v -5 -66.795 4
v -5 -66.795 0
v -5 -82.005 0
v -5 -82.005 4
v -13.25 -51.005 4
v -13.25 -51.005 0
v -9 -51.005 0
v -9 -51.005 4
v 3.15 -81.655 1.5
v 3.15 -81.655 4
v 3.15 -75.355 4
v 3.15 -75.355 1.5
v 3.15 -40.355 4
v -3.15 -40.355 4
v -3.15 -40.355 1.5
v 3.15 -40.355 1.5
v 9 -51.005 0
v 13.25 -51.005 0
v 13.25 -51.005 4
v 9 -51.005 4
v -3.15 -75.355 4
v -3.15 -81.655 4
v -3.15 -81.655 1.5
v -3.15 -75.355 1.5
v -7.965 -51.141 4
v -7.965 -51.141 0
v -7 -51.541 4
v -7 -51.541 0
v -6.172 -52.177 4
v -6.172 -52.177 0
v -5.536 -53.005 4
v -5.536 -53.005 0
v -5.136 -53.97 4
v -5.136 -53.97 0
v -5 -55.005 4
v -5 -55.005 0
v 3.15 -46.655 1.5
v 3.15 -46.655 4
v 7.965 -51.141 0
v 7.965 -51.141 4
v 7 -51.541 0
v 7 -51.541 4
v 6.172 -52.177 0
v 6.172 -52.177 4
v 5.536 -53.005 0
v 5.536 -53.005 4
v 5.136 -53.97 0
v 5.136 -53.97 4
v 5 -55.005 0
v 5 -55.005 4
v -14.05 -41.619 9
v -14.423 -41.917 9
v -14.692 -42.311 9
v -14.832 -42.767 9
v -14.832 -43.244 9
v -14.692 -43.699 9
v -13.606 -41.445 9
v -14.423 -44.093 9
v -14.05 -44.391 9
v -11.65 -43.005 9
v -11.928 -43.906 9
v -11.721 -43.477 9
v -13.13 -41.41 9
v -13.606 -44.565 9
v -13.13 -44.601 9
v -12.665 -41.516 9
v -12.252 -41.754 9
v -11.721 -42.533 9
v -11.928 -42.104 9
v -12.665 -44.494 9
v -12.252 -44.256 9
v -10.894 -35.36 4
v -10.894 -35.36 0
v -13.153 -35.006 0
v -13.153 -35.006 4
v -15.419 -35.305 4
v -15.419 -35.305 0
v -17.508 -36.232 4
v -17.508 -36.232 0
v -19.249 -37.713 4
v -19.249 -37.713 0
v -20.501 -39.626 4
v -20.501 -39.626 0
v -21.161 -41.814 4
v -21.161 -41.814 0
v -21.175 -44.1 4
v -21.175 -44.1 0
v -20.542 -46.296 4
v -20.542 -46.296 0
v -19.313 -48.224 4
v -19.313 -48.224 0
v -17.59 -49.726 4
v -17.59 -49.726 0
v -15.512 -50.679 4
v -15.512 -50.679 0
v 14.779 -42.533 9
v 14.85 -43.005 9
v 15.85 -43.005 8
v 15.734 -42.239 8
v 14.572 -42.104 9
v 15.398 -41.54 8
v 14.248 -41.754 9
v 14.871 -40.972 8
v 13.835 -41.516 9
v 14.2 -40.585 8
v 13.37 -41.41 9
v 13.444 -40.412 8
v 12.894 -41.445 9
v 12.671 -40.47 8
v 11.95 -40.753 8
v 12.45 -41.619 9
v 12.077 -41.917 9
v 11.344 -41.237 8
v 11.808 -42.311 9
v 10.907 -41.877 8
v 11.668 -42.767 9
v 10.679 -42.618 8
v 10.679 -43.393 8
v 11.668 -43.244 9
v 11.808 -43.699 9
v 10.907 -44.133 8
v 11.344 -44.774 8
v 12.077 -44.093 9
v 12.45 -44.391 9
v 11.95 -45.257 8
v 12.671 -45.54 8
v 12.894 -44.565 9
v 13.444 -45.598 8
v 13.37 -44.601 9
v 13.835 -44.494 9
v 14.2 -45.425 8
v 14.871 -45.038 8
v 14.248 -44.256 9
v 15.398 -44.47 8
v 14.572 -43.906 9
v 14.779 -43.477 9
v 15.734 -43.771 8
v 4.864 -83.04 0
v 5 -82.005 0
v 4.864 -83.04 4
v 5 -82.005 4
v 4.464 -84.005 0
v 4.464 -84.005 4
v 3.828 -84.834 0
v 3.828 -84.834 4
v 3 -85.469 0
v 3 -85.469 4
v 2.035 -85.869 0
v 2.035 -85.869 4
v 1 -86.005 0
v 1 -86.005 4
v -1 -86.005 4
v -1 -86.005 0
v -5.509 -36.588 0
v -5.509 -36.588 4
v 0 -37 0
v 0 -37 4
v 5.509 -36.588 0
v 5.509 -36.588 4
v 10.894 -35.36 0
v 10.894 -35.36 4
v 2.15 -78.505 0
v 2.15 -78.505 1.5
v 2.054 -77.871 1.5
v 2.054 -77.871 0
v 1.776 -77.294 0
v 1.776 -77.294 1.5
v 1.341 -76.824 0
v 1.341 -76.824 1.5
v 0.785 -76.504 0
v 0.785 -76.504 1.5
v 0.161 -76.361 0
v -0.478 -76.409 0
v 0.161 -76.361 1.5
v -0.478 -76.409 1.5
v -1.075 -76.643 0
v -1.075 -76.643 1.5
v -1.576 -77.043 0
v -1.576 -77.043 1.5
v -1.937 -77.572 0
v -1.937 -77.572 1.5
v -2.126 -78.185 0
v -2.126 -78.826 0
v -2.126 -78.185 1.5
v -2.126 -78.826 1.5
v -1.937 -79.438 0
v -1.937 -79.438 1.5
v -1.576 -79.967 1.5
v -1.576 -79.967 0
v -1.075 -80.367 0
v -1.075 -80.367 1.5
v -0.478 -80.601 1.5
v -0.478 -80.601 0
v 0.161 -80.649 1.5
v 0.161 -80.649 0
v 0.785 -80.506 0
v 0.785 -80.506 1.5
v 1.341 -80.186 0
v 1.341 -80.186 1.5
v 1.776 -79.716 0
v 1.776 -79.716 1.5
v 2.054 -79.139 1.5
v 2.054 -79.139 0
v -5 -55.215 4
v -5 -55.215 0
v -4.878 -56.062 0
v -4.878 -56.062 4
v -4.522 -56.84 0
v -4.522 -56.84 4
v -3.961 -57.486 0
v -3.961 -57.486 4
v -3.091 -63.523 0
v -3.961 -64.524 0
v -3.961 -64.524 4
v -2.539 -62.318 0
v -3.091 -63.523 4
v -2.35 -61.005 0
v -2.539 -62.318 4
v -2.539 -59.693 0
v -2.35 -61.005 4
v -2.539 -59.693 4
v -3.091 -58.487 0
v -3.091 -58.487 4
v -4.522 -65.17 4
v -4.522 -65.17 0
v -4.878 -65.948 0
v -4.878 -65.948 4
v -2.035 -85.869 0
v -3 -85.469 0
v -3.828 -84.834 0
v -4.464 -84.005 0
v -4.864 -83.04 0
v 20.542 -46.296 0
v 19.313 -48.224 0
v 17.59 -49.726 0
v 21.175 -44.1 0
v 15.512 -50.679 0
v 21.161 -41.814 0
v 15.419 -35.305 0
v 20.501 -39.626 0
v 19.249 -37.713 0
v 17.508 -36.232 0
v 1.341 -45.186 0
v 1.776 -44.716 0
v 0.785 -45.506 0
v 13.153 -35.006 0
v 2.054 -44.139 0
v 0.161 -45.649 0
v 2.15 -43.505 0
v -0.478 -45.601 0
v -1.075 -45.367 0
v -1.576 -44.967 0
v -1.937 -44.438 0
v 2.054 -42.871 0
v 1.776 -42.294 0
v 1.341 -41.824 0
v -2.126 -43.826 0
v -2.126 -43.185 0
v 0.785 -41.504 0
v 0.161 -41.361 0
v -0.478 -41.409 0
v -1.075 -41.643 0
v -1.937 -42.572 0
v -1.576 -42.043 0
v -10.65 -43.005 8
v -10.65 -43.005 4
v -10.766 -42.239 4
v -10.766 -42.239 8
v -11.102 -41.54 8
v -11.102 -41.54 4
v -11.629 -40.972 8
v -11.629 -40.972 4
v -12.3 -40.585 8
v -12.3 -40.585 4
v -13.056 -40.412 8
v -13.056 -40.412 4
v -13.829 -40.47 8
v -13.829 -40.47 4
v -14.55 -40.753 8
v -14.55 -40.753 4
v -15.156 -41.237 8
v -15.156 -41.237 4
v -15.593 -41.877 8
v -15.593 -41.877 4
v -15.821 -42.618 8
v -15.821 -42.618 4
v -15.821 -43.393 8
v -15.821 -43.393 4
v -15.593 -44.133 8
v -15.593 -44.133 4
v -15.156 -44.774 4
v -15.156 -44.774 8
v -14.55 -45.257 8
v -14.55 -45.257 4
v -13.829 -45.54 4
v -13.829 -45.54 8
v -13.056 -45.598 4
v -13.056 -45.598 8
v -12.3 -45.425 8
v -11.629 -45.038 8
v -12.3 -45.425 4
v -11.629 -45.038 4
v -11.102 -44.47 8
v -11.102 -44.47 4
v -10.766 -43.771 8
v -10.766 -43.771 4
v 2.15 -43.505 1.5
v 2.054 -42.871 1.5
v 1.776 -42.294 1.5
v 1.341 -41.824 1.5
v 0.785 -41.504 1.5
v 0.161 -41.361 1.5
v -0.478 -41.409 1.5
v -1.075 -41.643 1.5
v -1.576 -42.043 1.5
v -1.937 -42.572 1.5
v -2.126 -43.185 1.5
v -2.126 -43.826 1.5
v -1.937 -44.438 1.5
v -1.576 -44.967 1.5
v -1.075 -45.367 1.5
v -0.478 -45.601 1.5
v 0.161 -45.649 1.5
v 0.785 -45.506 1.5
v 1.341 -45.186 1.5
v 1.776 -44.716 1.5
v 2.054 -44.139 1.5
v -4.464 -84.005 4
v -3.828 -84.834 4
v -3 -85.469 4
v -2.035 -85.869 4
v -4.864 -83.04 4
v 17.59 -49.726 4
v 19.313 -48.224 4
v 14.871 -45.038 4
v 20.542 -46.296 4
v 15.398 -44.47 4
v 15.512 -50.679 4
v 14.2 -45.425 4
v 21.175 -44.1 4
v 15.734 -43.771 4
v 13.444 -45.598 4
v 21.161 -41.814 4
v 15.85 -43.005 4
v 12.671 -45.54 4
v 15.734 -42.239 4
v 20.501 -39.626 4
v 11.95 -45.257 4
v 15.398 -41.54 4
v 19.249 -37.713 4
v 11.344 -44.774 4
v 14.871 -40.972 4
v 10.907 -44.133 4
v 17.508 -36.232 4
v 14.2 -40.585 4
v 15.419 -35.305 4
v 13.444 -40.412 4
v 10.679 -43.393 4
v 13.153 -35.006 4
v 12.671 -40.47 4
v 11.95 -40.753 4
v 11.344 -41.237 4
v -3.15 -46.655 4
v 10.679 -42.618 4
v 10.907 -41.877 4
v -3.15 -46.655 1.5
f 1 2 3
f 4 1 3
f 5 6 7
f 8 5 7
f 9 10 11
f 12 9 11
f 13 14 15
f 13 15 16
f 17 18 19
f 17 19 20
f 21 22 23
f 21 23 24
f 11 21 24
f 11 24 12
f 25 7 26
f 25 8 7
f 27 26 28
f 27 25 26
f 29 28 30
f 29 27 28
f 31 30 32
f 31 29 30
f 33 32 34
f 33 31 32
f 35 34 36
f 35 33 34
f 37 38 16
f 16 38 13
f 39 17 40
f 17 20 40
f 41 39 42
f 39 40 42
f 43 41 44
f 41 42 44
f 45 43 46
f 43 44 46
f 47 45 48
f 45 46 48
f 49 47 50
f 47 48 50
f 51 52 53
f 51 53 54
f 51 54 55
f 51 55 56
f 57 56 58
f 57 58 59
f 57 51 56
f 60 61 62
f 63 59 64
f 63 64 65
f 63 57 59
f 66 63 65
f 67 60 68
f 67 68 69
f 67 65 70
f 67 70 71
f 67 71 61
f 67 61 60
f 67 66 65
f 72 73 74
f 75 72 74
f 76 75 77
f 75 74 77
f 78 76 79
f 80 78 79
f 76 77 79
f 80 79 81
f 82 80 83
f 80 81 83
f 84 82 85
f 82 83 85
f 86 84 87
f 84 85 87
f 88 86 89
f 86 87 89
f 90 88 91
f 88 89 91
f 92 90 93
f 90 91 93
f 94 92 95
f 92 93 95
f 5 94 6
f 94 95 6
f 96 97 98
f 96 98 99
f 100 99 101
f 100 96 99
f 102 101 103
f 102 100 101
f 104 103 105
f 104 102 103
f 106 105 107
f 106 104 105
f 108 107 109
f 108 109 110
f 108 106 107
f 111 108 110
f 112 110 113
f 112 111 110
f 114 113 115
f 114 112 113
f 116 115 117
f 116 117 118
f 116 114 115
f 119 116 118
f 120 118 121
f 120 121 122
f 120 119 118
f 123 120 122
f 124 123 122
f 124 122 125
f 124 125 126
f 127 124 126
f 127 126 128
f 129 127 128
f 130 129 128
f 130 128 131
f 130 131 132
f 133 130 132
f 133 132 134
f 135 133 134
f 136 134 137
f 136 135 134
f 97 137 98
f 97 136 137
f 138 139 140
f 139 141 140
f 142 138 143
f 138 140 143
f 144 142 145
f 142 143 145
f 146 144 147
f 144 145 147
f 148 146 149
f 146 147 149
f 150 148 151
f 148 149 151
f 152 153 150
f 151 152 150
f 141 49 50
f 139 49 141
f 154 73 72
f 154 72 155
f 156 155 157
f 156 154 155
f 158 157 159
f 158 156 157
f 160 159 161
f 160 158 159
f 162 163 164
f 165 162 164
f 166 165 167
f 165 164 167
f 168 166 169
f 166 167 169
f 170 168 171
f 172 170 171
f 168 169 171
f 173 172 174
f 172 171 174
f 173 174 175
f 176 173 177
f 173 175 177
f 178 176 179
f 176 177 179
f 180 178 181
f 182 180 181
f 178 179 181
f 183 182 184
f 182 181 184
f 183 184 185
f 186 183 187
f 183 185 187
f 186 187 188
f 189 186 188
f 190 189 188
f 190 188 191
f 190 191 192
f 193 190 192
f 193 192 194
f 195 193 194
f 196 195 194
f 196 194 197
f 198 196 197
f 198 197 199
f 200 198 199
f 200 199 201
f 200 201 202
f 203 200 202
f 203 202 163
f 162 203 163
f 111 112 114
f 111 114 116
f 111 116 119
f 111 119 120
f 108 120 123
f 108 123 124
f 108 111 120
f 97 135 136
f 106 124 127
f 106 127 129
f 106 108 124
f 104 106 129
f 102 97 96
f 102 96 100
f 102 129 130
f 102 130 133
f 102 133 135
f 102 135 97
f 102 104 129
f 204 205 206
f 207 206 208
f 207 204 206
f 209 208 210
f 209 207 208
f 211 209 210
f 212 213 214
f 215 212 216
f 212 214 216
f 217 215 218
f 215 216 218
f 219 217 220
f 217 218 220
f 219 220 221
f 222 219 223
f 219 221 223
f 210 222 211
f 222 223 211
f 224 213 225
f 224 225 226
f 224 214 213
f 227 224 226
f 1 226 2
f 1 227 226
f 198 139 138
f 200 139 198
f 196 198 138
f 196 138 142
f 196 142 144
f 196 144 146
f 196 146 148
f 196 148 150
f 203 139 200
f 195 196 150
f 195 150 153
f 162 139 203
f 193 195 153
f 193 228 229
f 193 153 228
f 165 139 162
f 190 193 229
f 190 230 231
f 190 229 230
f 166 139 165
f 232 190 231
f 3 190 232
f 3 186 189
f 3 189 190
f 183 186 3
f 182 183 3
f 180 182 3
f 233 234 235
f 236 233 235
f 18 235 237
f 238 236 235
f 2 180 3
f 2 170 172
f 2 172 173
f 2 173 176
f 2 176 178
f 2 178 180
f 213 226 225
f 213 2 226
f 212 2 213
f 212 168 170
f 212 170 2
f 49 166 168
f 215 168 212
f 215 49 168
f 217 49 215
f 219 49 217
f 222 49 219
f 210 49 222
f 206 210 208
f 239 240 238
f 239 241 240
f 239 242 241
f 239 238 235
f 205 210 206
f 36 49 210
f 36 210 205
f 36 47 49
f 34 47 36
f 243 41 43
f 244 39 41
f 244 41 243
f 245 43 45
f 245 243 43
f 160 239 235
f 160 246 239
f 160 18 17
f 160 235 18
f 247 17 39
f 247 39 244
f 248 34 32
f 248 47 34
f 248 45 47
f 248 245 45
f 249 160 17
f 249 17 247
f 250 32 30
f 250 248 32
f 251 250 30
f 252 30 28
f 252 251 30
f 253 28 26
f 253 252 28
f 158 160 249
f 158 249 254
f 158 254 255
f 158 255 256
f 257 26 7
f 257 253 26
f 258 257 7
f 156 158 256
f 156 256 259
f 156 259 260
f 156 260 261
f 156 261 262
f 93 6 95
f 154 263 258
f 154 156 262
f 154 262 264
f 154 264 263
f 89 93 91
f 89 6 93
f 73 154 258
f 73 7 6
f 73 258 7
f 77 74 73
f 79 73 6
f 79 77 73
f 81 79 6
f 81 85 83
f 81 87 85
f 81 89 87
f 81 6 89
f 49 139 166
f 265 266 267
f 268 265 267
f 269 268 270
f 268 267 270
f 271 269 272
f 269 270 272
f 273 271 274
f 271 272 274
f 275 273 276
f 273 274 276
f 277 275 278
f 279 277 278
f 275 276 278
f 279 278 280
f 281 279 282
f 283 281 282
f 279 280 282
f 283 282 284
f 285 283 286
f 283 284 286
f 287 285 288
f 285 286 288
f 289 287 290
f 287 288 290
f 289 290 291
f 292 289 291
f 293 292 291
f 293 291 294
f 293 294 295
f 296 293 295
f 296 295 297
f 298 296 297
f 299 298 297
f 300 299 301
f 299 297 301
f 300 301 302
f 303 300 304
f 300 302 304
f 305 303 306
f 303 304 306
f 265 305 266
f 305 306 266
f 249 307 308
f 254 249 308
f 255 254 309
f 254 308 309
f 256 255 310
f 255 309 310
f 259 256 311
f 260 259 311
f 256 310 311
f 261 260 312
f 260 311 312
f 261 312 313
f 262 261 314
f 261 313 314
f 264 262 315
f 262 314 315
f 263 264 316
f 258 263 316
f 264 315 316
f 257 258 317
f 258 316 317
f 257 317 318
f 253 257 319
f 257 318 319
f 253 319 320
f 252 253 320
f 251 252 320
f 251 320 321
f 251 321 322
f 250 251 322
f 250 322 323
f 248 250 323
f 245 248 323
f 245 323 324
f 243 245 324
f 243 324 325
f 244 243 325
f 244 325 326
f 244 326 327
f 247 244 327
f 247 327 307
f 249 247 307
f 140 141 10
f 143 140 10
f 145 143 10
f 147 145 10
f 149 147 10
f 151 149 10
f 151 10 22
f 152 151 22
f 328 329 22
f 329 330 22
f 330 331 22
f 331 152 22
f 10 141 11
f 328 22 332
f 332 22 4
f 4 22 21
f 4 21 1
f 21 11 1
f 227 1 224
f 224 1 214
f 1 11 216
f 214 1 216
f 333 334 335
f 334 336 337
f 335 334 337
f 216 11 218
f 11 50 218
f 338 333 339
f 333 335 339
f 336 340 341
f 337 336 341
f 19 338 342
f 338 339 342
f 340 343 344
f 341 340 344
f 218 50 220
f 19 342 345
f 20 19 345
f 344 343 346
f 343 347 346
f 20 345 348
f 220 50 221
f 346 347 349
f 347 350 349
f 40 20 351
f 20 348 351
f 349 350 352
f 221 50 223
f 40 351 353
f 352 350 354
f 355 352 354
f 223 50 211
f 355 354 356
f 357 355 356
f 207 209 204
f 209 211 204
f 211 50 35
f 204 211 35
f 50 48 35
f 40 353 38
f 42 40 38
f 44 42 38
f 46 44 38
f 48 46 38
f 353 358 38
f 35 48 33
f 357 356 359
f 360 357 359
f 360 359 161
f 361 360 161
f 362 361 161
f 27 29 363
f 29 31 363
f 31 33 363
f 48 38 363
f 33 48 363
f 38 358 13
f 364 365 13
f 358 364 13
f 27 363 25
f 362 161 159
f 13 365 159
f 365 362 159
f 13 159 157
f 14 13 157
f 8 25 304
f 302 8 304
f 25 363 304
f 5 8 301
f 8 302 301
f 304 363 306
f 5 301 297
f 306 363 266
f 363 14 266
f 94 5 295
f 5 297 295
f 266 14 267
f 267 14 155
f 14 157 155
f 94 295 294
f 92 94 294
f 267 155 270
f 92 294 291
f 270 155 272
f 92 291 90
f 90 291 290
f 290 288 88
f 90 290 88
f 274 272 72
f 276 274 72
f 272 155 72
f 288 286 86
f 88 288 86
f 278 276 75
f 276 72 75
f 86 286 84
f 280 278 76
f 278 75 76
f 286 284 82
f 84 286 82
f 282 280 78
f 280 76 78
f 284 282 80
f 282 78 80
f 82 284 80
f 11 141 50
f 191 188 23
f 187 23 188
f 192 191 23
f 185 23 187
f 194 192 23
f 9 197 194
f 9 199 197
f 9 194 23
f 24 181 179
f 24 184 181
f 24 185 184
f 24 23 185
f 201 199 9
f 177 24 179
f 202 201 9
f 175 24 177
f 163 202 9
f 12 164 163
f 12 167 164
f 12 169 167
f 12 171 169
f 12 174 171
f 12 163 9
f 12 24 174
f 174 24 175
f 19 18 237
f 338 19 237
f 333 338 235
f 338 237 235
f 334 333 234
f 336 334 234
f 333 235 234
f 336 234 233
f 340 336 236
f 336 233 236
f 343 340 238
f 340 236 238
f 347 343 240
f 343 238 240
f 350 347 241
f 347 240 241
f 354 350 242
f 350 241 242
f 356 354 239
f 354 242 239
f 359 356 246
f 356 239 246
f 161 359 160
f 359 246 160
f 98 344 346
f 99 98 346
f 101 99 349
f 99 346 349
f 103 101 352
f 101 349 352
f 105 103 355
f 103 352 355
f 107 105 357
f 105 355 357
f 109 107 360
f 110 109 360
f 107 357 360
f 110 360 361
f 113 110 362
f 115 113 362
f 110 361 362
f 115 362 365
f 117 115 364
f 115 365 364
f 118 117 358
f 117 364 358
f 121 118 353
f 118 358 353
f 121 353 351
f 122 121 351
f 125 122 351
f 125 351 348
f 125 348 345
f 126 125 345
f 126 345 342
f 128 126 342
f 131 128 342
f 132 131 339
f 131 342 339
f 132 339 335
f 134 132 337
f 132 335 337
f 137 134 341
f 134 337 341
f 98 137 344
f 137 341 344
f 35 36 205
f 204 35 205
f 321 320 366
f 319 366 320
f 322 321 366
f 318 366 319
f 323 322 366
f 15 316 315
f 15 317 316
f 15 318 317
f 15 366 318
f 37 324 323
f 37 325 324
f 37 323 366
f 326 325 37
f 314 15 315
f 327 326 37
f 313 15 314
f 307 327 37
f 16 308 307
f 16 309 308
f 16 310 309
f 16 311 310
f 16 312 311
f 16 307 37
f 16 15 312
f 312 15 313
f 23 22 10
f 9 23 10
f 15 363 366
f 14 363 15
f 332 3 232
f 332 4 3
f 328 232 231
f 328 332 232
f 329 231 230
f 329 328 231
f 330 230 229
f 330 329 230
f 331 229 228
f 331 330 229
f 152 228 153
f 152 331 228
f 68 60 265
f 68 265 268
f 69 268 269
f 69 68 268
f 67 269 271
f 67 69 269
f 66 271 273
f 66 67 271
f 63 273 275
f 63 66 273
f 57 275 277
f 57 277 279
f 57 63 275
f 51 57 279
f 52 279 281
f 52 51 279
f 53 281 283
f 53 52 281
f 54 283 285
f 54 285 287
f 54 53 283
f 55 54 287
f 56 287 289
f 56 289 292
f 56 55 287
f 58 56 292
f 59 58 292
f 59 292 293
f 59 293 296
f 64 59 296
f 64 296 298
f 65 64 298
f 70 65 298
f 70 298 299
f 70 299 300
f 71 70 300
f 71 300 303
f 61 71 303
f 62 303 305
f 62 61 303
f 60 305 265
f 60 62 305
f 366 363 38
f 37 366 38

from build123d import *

# Parameters (mm, degrees)
PAD015_DEPTH    = 4
SKETCH023_R     = 2.6
PAD016_DEPTH    = 5
SKETCH024_R     = 2.15
POCKET009_DEPTH = 4.001
SKETCH025_W     = 6.3
SKETCH025_H     = 6.3
POCKET010_DEPTH = 2.5
FILLET007_R     = 4
CHAMFER003_SIZE = 1
SKETCH026_R     = 4.65
POCKET011_DEPTH = 4.001
FILLET008_R     = 3


with BuildPart() as part:
    # Sketch022 → Pad015 (new body)
    with BuildSketch(Plane.XY):
        with BuildLine():
            ThreePointArc((-10.894444, -35.359738), (0, -37), (10.894444, -35.359738))
            ThreePointArc((13.25, -51.005087), (21.16084, -41.814035), (10.894444, -35.359738))
            Line((13.25, -51.005087), (5, -51.005087))
            Line((5, -51.005087), (5, -86.005087))
            Line((-5, -86.005087), (5, -86.005087))
            Line((-5, -51.005087), (-5, -86.005087))
            Line((-13.25, -51.005087), (-5, -51.005087))
            ThreePointArc((-10.894444, -35.359738), (-21.16084, -41.814035), (-13.25, -51.005087))
        make_face()
    extrude(amount=PAD015_DEPTH)

    # Sketch023 (on Face10 of Pad015) → Pad016 (join)
    with BuildSketch(Plane.XY.offset(4)):
        with Locations((-13.25, -43.005087)):
            Circle(SKETCH023_R)
        with Locations((13.25, -43.005087)):
            Circle(SKETCH023_R)
    extrude(amount=PAD016_DEPTH)

    # Sketch024 (on Face5 of Pad016) → Pocket009 (cut, through all)
    with BuildSketch(Plane.XY.offset(4)):
        with Locations((0, -43.505087)):
            Circle(SKETCH024_R)
        with Locations((0, -78.505087)):
            Circle(SKETCH024_R)
    extrude(amount=-POCKET009_DEPTH, mode=Mode.SUBTRACT)

    # Sketch025 (on Face5 of Pocket009) → Pocket010 (cut)
    with BuildSketch(Plane.XY.offset(4)):
        with Locations((0, -43.505087)):
            Rectangle(SKETCH025_W, SKETCH025_H)
        with Locations((0, -78.505087)):
            Rectangle(SKETCH025_W, SKETCH025_H)
    extrude(amount=-POCKET010_DEPTH, mode=Mode.SUBTRACT)

    # Fillet007
    fillet007_edges = [part.edges().sort_by_distance(p)[0] for p in [
        (5, -51.005087, 2),
        (-5, -51.005087, 2),
        (-5, -86.005087, 2),
        (5, -86.005087, 2),
    ]]
    fillet(fillet007_edges, radius=FILLET007_R)

    # Chamfer003
    chamfer003_edges = [part.edges().sort_by_distance(p)[0] for p in [
        (-15.85, -43.005087, 9),
        (10.65, -43.005087, 9),
    ]]
    chamfer(chamfer003_edges, length=CHAMFER003_SIZE)

    # Sketch026 (on Face3 of Chamfer003) → Pocket011 (cut, through all)
    with BuildSketch(Plane.XY.offset(4)):
        with Locations((-7, -61.005087)):
            Circle(SKETCH026_R)
    extrude(amount=-POCKET011_DEPTH, mode=Mode.SUBTRACT)

    # Fillet008
    fillet008_edges = [part.edges().sort_by_distance(p)[0] for p in [
        (-5, -56.807171, 2),
        (-5, -65.203003, 2),
    ]]
    fillet(fillet008_edges, radius=FILLET008_R)


solid = part.part
